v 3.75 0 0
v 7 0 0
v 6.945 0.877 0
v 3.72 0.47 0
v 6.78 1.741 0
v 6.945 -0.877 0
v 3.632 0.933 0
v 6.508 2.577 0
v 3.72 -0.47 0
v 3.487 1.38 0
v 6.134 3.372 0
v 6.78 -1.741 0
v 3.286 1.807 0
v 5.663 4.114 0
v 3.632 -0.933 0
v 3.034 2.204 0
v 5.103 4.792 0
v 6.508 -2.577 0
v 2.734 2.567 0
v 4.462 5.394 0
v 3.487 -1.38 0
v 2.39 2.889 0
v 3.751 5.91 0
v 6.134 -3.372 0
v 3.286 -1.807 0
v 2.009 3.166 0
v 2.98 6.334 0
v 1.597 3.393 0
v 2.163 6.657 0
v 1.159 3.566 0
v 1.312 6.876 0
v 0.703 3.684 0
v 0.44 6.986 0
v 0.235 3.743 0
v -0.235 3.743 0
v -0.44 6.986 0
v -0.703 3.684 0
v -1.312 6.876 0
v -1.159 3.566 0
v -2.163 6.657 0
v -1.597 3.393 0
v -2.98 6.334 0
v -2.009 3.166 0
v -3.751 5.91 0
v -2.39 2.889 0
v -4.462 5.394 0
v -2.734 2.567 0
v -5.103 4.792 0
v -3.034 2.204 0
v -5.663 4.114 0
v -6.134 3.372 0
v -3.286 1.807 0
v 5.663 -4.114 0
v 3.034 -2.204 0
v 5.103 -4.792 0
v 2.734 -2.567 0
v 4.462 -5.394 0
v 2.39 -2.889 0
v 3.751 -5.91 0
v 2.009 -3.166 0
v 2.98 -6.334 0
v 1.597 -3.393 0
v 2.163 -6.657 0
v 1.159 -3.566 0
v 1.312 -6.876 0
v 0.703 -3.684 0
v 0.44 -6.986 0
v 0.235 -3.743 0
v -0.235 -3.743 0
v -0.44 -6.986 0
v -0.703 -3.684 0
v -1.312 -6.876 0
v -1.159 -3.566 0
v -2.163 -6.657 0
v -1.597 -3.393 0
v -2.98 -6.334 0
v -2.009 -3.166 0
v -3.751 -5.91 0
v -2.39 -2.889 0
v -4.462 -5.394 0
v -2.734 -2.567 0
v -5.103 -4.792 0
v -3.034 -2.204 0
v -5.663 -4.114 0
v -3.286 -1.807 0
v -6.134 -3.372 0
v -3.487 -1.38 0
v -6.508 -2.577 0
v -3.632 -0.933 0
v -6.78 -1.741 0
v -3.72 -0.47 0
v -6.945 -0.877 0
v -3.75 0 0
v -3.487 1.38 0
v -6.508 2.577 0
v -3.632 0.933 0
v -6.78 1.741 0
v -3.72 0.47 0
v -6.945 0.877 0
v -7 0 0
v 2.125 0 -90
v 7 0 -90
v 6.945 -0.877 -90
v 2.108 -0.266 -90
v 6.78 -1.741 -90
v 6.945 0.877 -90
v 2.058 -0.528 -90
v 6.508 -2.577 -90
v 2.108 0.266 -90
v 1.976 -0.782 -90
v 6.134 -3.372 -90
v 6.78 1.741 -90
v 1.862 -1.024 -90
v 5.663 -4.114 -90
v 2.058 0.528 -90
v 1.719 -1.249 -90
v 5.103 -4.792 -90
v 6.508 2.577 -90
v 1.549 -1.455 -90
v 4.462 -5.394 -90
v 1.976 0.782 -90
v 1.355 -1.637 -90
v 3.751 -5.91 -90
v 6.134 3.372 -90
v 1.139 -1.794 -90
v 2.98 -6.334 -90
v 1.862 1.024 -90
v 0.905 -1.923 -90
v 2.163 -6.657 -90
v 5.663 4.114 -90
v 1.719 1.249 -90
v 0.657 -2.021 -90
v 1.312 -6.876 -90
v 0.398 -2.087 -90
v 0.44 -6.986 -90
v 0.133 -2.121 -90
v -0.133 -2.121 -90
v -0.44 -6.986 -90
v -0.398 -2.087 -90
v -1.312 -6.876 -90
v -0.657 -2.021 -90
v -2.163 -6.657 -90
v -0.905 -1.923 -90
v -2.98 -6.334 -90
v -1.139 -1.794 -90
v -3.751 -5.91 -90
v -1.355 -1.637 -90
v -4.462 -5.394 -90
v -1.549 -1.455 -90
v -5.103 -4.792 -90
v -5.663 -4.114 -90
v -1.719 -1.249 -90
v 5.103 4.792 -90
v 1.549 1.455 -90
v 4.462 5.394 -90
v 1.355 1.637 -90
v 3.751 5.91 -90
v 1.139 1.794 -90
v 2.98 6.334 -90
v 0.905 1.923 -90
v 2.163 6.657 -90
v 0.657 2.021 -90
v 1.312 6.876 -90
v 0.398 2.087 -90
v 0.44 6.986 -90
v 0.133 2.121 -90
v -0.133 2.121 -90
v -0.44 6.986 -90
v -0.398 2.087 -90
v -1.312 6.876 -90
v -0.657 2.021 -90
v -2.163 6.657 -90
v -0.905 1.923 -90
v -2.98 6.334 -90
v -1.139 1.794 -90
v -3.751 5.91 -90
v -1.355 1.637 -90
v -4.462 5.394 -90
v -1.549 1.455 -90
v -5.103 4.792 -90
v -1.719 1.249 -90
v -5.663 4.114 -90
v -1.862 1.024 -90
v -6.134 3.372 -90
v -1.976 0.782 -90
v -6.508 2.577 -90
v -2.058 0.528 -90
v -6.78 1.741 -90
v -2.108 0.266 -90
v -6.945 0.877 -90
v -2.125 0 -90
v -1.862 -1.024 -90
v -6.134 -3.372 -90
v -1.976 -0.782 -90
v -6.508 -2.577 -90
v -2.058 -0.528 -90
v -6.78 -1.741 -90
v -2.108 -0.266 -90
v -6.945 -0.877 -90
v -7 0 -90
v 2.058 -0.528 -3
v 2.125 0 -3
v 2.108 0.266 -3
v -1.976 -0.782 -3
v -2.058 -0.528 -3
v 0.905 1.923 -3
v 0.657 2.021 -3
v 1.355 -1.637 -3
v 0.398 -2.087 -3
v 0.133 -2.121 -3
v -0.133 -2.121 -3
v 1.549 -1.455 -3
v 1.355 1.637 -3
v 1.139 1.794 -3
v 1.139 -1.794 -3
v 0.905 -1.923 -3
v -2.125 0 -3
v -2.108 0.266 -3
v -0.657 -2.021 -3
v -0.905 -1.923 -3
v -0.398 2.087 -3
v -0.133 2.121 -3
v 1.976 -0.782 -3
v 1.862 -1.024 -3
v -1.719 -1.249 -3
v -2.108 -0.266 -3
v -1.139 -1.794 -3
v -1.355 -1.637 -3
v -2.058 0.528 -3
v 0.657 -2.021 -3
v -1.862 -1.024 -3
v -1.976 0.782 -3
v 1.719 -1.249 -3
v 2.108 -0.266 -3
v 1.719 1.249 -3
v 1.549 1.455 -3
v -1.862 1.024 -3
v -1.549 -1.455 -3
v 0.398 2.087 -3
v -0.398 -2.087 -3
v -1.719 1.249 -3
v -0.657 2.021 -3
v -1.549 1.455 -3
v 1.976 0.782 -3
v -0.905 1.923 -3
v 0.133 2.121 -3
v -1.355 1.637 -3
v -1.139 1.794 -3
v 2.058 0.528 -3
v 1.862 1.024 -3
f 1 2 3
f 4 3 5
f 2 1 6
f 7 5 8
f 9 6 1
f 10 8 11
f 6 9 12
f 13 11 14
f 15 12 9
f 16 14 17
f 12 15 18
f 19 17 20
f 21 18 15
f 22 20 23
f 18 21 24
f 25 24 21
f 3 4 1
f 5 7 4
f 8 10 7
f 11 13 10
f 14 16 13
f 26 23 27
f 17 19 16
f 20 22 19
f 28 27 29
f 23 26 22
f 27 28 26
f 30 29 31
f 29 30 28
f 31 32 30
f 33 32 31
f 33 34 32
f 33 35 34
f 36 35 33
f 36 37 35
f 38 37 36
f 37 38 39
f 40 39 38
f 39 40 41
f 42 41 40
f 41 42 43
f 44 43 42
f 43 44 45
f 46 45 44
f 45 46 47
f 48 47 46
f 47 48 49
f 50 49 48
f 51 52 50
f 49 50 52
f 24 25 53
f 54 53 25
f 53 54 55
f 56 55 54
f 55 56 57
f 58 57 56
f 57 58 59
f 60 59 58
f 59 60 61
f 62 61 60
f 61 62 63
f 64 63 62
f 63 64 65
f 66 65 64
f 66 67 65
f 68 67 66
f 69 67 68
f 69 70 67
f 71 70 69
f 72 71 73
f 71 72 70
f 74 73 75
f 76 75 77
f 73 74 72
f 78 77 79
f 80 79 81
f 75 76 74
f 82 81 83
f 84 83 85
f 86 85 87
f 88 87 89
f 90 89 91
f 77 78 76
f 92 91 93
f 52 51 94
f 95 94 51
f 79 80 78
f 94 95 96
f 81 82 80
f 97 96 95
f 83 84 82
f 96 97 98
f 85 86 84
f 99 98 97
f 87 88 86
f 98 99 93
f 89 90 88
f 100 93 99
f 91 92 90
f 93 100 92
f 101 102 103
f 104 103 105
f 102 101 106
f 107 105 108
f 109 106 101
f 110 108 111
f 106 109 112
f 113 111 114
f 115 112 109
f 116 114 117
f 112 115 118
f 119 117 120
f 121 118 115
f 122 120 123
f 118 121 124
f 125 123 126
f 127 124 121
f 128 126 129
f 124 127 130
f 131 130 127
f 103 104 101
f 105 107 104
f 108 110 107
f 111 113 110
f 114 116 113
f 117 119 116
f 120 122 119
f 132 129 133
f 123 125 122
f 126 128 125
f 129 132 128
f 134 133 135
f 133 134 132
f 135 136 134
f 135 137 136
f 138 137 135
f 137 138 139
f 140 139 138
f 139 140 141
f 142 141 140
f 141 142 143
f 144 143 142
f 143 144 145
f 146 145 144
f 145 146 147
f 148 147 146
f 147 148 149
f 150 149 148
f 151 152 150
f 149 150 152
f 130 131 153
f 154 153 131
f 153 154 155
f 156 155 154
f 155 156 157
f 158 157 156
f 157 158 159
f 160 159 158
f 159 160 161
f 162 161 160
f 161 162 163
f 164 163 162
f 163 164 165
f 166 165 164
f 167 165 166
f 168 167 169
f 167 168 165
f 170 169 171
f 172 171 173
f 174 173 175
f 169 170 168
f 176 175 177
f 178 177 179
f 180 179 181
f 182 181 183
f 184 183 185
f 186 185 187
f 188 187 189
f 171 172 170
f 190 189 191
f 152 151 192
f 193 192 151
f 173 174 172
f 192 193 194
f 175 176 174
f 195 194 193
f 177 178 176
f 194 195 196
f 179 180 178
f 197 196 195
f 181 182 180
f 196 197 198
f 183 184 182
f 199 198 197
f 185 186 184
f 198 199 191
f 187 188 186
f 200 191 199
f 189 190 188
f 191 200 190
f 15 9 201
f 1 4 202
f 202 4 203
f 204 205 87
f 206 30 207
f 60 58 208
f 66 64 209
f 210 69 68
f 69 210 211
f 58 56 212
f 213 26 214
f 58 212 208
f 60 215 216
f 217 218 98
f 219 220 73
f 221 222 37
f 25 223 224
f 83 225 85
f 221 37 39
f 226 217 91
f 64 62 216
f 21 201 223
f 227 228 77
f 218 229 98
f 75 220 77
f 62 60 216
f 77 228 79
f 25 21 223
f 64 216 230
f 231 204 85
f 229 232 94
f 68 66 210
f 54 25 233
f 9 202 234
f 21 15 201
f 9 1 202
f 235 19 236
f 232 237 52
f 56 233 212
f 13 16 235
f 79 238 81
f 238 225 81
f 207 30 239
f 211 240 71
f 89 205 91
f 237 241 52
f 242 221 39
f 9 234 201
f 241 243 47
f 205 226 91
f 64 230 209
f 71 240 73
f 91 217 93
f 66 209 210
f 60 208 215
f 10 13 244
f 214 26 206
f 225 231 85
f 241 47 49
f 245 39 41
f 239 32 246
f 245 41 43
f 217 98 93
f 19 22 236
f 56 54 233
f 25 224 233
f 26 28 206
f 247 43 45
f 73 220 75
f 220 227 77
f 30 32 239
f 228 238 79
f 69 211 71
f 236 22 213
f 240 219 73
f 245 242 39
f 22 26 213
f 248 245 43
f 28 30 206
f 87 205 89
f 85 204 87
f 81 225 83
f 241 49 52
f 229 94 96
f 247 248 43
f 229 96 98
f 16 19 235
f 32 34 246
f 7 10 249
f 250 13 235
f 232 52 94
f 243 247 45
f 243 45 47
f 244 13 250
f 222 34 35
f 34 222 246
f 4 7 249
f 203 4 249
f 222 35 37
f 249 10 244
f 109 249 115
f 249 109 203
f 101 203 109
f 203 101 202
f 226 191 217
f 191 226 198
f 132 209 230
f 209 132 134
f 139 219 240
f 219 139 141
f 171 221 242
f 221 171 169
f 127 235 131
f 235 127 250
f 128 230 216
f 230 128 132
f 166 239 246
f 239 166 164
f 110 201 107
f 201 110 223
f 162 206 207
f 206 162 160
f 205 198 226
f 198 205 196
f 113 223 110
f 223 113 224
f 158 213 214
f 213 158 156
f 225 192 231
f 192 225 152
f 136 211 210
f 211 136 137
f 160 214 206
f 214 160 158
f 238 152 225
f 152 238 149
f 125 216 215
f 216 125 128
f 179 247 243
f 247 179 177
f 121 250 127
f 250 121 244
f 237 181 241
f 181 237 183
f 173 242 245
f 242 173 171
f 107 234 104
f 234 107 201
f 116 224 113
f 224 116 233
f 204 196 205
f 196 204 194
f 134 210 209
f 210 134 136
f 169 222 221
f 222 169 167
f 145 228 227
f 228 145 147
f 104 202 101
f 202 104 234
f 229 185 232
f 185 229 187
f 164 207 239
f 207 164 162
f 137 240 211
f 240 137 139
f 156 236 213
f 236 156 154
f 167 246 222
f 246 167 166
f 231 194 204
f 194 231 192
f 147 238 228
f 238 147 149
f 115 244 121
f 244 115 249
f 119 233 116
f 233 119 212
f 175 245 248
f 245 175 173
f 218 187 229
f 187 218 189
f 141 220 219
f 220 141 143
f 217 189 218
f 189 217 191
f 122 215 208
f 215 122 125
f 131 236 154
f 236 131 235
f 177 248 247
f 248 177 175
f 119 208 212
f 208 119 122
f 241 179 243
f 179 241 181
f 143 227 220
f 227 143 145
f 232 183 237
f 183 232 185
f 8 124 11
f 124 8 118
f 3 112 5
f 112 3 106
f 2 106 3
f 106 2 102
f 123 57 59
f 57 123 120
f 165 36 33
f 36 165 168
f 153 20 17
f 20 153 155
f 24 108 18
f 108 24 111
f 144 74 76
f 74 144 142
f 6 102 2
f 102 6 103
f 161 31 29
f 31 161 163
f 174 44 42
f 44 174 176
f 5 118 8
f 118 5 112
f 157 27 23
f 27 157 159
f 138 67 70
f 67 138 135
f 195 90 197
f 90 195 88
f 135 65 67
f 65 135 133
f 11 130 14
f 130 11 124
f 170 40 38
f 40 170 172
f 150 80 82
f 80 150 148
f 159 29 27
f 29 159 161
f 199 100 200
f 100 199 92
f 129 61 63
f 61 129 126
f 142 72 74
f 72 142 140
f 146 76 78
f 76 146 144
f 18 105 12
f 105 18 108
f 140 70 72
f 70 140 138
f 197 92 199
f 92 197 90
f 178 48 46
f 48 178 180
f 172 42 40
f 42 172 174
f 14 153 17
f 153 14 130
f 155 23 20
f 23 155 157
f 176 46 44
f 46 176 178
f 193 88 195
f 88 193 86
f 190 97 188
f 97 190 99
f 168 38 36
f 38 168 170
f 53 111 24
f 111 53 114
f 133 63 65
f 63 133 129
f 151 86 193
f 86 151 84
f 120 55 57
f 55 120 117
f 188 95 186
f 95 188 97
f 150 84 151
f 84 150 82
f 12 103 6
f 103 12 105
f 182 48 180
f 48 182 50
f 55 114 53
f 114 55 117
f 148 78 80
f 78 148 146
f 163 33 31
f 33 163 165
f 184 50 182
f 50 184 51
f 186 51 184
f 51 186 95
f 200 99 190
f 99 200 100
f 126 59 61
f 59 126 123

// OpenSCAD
$fn = 50;


difference() {
	union() {
		translate(v = [0, 0, -90.0000000000]) {
			cylinder(h = 90, r = 7.0000000000);
		}
		cylinder(h = 0, r = 10.0000000000);
	}
	union() {
		translate(v = [0, 0, 0]) {
			rotate(a = [0, 0, 0]) {
				difference() {
					union() {
						#translate(v = [0, 0, -90.0000000000]) {
							cylinder(h = 90, r = 2.0000000000);
						}
						#translate(v = [0, 0, -3]) {
							cylinder(h = 3, r = 7.0000000000, r1 = 2.1250000000, r2 = 3.7500000000);
						}
						#translate(v = [0, 0, -90.0000000000]) {
							cylinder(h = 90, r = 2.1250000000);
						}
						#translate(v = [0, 0, -90.0000000000]) {
							cylinder(h = 90, r = 2.0000000000);
						}
					}
					union();
				}
			}
		}
	}
}
